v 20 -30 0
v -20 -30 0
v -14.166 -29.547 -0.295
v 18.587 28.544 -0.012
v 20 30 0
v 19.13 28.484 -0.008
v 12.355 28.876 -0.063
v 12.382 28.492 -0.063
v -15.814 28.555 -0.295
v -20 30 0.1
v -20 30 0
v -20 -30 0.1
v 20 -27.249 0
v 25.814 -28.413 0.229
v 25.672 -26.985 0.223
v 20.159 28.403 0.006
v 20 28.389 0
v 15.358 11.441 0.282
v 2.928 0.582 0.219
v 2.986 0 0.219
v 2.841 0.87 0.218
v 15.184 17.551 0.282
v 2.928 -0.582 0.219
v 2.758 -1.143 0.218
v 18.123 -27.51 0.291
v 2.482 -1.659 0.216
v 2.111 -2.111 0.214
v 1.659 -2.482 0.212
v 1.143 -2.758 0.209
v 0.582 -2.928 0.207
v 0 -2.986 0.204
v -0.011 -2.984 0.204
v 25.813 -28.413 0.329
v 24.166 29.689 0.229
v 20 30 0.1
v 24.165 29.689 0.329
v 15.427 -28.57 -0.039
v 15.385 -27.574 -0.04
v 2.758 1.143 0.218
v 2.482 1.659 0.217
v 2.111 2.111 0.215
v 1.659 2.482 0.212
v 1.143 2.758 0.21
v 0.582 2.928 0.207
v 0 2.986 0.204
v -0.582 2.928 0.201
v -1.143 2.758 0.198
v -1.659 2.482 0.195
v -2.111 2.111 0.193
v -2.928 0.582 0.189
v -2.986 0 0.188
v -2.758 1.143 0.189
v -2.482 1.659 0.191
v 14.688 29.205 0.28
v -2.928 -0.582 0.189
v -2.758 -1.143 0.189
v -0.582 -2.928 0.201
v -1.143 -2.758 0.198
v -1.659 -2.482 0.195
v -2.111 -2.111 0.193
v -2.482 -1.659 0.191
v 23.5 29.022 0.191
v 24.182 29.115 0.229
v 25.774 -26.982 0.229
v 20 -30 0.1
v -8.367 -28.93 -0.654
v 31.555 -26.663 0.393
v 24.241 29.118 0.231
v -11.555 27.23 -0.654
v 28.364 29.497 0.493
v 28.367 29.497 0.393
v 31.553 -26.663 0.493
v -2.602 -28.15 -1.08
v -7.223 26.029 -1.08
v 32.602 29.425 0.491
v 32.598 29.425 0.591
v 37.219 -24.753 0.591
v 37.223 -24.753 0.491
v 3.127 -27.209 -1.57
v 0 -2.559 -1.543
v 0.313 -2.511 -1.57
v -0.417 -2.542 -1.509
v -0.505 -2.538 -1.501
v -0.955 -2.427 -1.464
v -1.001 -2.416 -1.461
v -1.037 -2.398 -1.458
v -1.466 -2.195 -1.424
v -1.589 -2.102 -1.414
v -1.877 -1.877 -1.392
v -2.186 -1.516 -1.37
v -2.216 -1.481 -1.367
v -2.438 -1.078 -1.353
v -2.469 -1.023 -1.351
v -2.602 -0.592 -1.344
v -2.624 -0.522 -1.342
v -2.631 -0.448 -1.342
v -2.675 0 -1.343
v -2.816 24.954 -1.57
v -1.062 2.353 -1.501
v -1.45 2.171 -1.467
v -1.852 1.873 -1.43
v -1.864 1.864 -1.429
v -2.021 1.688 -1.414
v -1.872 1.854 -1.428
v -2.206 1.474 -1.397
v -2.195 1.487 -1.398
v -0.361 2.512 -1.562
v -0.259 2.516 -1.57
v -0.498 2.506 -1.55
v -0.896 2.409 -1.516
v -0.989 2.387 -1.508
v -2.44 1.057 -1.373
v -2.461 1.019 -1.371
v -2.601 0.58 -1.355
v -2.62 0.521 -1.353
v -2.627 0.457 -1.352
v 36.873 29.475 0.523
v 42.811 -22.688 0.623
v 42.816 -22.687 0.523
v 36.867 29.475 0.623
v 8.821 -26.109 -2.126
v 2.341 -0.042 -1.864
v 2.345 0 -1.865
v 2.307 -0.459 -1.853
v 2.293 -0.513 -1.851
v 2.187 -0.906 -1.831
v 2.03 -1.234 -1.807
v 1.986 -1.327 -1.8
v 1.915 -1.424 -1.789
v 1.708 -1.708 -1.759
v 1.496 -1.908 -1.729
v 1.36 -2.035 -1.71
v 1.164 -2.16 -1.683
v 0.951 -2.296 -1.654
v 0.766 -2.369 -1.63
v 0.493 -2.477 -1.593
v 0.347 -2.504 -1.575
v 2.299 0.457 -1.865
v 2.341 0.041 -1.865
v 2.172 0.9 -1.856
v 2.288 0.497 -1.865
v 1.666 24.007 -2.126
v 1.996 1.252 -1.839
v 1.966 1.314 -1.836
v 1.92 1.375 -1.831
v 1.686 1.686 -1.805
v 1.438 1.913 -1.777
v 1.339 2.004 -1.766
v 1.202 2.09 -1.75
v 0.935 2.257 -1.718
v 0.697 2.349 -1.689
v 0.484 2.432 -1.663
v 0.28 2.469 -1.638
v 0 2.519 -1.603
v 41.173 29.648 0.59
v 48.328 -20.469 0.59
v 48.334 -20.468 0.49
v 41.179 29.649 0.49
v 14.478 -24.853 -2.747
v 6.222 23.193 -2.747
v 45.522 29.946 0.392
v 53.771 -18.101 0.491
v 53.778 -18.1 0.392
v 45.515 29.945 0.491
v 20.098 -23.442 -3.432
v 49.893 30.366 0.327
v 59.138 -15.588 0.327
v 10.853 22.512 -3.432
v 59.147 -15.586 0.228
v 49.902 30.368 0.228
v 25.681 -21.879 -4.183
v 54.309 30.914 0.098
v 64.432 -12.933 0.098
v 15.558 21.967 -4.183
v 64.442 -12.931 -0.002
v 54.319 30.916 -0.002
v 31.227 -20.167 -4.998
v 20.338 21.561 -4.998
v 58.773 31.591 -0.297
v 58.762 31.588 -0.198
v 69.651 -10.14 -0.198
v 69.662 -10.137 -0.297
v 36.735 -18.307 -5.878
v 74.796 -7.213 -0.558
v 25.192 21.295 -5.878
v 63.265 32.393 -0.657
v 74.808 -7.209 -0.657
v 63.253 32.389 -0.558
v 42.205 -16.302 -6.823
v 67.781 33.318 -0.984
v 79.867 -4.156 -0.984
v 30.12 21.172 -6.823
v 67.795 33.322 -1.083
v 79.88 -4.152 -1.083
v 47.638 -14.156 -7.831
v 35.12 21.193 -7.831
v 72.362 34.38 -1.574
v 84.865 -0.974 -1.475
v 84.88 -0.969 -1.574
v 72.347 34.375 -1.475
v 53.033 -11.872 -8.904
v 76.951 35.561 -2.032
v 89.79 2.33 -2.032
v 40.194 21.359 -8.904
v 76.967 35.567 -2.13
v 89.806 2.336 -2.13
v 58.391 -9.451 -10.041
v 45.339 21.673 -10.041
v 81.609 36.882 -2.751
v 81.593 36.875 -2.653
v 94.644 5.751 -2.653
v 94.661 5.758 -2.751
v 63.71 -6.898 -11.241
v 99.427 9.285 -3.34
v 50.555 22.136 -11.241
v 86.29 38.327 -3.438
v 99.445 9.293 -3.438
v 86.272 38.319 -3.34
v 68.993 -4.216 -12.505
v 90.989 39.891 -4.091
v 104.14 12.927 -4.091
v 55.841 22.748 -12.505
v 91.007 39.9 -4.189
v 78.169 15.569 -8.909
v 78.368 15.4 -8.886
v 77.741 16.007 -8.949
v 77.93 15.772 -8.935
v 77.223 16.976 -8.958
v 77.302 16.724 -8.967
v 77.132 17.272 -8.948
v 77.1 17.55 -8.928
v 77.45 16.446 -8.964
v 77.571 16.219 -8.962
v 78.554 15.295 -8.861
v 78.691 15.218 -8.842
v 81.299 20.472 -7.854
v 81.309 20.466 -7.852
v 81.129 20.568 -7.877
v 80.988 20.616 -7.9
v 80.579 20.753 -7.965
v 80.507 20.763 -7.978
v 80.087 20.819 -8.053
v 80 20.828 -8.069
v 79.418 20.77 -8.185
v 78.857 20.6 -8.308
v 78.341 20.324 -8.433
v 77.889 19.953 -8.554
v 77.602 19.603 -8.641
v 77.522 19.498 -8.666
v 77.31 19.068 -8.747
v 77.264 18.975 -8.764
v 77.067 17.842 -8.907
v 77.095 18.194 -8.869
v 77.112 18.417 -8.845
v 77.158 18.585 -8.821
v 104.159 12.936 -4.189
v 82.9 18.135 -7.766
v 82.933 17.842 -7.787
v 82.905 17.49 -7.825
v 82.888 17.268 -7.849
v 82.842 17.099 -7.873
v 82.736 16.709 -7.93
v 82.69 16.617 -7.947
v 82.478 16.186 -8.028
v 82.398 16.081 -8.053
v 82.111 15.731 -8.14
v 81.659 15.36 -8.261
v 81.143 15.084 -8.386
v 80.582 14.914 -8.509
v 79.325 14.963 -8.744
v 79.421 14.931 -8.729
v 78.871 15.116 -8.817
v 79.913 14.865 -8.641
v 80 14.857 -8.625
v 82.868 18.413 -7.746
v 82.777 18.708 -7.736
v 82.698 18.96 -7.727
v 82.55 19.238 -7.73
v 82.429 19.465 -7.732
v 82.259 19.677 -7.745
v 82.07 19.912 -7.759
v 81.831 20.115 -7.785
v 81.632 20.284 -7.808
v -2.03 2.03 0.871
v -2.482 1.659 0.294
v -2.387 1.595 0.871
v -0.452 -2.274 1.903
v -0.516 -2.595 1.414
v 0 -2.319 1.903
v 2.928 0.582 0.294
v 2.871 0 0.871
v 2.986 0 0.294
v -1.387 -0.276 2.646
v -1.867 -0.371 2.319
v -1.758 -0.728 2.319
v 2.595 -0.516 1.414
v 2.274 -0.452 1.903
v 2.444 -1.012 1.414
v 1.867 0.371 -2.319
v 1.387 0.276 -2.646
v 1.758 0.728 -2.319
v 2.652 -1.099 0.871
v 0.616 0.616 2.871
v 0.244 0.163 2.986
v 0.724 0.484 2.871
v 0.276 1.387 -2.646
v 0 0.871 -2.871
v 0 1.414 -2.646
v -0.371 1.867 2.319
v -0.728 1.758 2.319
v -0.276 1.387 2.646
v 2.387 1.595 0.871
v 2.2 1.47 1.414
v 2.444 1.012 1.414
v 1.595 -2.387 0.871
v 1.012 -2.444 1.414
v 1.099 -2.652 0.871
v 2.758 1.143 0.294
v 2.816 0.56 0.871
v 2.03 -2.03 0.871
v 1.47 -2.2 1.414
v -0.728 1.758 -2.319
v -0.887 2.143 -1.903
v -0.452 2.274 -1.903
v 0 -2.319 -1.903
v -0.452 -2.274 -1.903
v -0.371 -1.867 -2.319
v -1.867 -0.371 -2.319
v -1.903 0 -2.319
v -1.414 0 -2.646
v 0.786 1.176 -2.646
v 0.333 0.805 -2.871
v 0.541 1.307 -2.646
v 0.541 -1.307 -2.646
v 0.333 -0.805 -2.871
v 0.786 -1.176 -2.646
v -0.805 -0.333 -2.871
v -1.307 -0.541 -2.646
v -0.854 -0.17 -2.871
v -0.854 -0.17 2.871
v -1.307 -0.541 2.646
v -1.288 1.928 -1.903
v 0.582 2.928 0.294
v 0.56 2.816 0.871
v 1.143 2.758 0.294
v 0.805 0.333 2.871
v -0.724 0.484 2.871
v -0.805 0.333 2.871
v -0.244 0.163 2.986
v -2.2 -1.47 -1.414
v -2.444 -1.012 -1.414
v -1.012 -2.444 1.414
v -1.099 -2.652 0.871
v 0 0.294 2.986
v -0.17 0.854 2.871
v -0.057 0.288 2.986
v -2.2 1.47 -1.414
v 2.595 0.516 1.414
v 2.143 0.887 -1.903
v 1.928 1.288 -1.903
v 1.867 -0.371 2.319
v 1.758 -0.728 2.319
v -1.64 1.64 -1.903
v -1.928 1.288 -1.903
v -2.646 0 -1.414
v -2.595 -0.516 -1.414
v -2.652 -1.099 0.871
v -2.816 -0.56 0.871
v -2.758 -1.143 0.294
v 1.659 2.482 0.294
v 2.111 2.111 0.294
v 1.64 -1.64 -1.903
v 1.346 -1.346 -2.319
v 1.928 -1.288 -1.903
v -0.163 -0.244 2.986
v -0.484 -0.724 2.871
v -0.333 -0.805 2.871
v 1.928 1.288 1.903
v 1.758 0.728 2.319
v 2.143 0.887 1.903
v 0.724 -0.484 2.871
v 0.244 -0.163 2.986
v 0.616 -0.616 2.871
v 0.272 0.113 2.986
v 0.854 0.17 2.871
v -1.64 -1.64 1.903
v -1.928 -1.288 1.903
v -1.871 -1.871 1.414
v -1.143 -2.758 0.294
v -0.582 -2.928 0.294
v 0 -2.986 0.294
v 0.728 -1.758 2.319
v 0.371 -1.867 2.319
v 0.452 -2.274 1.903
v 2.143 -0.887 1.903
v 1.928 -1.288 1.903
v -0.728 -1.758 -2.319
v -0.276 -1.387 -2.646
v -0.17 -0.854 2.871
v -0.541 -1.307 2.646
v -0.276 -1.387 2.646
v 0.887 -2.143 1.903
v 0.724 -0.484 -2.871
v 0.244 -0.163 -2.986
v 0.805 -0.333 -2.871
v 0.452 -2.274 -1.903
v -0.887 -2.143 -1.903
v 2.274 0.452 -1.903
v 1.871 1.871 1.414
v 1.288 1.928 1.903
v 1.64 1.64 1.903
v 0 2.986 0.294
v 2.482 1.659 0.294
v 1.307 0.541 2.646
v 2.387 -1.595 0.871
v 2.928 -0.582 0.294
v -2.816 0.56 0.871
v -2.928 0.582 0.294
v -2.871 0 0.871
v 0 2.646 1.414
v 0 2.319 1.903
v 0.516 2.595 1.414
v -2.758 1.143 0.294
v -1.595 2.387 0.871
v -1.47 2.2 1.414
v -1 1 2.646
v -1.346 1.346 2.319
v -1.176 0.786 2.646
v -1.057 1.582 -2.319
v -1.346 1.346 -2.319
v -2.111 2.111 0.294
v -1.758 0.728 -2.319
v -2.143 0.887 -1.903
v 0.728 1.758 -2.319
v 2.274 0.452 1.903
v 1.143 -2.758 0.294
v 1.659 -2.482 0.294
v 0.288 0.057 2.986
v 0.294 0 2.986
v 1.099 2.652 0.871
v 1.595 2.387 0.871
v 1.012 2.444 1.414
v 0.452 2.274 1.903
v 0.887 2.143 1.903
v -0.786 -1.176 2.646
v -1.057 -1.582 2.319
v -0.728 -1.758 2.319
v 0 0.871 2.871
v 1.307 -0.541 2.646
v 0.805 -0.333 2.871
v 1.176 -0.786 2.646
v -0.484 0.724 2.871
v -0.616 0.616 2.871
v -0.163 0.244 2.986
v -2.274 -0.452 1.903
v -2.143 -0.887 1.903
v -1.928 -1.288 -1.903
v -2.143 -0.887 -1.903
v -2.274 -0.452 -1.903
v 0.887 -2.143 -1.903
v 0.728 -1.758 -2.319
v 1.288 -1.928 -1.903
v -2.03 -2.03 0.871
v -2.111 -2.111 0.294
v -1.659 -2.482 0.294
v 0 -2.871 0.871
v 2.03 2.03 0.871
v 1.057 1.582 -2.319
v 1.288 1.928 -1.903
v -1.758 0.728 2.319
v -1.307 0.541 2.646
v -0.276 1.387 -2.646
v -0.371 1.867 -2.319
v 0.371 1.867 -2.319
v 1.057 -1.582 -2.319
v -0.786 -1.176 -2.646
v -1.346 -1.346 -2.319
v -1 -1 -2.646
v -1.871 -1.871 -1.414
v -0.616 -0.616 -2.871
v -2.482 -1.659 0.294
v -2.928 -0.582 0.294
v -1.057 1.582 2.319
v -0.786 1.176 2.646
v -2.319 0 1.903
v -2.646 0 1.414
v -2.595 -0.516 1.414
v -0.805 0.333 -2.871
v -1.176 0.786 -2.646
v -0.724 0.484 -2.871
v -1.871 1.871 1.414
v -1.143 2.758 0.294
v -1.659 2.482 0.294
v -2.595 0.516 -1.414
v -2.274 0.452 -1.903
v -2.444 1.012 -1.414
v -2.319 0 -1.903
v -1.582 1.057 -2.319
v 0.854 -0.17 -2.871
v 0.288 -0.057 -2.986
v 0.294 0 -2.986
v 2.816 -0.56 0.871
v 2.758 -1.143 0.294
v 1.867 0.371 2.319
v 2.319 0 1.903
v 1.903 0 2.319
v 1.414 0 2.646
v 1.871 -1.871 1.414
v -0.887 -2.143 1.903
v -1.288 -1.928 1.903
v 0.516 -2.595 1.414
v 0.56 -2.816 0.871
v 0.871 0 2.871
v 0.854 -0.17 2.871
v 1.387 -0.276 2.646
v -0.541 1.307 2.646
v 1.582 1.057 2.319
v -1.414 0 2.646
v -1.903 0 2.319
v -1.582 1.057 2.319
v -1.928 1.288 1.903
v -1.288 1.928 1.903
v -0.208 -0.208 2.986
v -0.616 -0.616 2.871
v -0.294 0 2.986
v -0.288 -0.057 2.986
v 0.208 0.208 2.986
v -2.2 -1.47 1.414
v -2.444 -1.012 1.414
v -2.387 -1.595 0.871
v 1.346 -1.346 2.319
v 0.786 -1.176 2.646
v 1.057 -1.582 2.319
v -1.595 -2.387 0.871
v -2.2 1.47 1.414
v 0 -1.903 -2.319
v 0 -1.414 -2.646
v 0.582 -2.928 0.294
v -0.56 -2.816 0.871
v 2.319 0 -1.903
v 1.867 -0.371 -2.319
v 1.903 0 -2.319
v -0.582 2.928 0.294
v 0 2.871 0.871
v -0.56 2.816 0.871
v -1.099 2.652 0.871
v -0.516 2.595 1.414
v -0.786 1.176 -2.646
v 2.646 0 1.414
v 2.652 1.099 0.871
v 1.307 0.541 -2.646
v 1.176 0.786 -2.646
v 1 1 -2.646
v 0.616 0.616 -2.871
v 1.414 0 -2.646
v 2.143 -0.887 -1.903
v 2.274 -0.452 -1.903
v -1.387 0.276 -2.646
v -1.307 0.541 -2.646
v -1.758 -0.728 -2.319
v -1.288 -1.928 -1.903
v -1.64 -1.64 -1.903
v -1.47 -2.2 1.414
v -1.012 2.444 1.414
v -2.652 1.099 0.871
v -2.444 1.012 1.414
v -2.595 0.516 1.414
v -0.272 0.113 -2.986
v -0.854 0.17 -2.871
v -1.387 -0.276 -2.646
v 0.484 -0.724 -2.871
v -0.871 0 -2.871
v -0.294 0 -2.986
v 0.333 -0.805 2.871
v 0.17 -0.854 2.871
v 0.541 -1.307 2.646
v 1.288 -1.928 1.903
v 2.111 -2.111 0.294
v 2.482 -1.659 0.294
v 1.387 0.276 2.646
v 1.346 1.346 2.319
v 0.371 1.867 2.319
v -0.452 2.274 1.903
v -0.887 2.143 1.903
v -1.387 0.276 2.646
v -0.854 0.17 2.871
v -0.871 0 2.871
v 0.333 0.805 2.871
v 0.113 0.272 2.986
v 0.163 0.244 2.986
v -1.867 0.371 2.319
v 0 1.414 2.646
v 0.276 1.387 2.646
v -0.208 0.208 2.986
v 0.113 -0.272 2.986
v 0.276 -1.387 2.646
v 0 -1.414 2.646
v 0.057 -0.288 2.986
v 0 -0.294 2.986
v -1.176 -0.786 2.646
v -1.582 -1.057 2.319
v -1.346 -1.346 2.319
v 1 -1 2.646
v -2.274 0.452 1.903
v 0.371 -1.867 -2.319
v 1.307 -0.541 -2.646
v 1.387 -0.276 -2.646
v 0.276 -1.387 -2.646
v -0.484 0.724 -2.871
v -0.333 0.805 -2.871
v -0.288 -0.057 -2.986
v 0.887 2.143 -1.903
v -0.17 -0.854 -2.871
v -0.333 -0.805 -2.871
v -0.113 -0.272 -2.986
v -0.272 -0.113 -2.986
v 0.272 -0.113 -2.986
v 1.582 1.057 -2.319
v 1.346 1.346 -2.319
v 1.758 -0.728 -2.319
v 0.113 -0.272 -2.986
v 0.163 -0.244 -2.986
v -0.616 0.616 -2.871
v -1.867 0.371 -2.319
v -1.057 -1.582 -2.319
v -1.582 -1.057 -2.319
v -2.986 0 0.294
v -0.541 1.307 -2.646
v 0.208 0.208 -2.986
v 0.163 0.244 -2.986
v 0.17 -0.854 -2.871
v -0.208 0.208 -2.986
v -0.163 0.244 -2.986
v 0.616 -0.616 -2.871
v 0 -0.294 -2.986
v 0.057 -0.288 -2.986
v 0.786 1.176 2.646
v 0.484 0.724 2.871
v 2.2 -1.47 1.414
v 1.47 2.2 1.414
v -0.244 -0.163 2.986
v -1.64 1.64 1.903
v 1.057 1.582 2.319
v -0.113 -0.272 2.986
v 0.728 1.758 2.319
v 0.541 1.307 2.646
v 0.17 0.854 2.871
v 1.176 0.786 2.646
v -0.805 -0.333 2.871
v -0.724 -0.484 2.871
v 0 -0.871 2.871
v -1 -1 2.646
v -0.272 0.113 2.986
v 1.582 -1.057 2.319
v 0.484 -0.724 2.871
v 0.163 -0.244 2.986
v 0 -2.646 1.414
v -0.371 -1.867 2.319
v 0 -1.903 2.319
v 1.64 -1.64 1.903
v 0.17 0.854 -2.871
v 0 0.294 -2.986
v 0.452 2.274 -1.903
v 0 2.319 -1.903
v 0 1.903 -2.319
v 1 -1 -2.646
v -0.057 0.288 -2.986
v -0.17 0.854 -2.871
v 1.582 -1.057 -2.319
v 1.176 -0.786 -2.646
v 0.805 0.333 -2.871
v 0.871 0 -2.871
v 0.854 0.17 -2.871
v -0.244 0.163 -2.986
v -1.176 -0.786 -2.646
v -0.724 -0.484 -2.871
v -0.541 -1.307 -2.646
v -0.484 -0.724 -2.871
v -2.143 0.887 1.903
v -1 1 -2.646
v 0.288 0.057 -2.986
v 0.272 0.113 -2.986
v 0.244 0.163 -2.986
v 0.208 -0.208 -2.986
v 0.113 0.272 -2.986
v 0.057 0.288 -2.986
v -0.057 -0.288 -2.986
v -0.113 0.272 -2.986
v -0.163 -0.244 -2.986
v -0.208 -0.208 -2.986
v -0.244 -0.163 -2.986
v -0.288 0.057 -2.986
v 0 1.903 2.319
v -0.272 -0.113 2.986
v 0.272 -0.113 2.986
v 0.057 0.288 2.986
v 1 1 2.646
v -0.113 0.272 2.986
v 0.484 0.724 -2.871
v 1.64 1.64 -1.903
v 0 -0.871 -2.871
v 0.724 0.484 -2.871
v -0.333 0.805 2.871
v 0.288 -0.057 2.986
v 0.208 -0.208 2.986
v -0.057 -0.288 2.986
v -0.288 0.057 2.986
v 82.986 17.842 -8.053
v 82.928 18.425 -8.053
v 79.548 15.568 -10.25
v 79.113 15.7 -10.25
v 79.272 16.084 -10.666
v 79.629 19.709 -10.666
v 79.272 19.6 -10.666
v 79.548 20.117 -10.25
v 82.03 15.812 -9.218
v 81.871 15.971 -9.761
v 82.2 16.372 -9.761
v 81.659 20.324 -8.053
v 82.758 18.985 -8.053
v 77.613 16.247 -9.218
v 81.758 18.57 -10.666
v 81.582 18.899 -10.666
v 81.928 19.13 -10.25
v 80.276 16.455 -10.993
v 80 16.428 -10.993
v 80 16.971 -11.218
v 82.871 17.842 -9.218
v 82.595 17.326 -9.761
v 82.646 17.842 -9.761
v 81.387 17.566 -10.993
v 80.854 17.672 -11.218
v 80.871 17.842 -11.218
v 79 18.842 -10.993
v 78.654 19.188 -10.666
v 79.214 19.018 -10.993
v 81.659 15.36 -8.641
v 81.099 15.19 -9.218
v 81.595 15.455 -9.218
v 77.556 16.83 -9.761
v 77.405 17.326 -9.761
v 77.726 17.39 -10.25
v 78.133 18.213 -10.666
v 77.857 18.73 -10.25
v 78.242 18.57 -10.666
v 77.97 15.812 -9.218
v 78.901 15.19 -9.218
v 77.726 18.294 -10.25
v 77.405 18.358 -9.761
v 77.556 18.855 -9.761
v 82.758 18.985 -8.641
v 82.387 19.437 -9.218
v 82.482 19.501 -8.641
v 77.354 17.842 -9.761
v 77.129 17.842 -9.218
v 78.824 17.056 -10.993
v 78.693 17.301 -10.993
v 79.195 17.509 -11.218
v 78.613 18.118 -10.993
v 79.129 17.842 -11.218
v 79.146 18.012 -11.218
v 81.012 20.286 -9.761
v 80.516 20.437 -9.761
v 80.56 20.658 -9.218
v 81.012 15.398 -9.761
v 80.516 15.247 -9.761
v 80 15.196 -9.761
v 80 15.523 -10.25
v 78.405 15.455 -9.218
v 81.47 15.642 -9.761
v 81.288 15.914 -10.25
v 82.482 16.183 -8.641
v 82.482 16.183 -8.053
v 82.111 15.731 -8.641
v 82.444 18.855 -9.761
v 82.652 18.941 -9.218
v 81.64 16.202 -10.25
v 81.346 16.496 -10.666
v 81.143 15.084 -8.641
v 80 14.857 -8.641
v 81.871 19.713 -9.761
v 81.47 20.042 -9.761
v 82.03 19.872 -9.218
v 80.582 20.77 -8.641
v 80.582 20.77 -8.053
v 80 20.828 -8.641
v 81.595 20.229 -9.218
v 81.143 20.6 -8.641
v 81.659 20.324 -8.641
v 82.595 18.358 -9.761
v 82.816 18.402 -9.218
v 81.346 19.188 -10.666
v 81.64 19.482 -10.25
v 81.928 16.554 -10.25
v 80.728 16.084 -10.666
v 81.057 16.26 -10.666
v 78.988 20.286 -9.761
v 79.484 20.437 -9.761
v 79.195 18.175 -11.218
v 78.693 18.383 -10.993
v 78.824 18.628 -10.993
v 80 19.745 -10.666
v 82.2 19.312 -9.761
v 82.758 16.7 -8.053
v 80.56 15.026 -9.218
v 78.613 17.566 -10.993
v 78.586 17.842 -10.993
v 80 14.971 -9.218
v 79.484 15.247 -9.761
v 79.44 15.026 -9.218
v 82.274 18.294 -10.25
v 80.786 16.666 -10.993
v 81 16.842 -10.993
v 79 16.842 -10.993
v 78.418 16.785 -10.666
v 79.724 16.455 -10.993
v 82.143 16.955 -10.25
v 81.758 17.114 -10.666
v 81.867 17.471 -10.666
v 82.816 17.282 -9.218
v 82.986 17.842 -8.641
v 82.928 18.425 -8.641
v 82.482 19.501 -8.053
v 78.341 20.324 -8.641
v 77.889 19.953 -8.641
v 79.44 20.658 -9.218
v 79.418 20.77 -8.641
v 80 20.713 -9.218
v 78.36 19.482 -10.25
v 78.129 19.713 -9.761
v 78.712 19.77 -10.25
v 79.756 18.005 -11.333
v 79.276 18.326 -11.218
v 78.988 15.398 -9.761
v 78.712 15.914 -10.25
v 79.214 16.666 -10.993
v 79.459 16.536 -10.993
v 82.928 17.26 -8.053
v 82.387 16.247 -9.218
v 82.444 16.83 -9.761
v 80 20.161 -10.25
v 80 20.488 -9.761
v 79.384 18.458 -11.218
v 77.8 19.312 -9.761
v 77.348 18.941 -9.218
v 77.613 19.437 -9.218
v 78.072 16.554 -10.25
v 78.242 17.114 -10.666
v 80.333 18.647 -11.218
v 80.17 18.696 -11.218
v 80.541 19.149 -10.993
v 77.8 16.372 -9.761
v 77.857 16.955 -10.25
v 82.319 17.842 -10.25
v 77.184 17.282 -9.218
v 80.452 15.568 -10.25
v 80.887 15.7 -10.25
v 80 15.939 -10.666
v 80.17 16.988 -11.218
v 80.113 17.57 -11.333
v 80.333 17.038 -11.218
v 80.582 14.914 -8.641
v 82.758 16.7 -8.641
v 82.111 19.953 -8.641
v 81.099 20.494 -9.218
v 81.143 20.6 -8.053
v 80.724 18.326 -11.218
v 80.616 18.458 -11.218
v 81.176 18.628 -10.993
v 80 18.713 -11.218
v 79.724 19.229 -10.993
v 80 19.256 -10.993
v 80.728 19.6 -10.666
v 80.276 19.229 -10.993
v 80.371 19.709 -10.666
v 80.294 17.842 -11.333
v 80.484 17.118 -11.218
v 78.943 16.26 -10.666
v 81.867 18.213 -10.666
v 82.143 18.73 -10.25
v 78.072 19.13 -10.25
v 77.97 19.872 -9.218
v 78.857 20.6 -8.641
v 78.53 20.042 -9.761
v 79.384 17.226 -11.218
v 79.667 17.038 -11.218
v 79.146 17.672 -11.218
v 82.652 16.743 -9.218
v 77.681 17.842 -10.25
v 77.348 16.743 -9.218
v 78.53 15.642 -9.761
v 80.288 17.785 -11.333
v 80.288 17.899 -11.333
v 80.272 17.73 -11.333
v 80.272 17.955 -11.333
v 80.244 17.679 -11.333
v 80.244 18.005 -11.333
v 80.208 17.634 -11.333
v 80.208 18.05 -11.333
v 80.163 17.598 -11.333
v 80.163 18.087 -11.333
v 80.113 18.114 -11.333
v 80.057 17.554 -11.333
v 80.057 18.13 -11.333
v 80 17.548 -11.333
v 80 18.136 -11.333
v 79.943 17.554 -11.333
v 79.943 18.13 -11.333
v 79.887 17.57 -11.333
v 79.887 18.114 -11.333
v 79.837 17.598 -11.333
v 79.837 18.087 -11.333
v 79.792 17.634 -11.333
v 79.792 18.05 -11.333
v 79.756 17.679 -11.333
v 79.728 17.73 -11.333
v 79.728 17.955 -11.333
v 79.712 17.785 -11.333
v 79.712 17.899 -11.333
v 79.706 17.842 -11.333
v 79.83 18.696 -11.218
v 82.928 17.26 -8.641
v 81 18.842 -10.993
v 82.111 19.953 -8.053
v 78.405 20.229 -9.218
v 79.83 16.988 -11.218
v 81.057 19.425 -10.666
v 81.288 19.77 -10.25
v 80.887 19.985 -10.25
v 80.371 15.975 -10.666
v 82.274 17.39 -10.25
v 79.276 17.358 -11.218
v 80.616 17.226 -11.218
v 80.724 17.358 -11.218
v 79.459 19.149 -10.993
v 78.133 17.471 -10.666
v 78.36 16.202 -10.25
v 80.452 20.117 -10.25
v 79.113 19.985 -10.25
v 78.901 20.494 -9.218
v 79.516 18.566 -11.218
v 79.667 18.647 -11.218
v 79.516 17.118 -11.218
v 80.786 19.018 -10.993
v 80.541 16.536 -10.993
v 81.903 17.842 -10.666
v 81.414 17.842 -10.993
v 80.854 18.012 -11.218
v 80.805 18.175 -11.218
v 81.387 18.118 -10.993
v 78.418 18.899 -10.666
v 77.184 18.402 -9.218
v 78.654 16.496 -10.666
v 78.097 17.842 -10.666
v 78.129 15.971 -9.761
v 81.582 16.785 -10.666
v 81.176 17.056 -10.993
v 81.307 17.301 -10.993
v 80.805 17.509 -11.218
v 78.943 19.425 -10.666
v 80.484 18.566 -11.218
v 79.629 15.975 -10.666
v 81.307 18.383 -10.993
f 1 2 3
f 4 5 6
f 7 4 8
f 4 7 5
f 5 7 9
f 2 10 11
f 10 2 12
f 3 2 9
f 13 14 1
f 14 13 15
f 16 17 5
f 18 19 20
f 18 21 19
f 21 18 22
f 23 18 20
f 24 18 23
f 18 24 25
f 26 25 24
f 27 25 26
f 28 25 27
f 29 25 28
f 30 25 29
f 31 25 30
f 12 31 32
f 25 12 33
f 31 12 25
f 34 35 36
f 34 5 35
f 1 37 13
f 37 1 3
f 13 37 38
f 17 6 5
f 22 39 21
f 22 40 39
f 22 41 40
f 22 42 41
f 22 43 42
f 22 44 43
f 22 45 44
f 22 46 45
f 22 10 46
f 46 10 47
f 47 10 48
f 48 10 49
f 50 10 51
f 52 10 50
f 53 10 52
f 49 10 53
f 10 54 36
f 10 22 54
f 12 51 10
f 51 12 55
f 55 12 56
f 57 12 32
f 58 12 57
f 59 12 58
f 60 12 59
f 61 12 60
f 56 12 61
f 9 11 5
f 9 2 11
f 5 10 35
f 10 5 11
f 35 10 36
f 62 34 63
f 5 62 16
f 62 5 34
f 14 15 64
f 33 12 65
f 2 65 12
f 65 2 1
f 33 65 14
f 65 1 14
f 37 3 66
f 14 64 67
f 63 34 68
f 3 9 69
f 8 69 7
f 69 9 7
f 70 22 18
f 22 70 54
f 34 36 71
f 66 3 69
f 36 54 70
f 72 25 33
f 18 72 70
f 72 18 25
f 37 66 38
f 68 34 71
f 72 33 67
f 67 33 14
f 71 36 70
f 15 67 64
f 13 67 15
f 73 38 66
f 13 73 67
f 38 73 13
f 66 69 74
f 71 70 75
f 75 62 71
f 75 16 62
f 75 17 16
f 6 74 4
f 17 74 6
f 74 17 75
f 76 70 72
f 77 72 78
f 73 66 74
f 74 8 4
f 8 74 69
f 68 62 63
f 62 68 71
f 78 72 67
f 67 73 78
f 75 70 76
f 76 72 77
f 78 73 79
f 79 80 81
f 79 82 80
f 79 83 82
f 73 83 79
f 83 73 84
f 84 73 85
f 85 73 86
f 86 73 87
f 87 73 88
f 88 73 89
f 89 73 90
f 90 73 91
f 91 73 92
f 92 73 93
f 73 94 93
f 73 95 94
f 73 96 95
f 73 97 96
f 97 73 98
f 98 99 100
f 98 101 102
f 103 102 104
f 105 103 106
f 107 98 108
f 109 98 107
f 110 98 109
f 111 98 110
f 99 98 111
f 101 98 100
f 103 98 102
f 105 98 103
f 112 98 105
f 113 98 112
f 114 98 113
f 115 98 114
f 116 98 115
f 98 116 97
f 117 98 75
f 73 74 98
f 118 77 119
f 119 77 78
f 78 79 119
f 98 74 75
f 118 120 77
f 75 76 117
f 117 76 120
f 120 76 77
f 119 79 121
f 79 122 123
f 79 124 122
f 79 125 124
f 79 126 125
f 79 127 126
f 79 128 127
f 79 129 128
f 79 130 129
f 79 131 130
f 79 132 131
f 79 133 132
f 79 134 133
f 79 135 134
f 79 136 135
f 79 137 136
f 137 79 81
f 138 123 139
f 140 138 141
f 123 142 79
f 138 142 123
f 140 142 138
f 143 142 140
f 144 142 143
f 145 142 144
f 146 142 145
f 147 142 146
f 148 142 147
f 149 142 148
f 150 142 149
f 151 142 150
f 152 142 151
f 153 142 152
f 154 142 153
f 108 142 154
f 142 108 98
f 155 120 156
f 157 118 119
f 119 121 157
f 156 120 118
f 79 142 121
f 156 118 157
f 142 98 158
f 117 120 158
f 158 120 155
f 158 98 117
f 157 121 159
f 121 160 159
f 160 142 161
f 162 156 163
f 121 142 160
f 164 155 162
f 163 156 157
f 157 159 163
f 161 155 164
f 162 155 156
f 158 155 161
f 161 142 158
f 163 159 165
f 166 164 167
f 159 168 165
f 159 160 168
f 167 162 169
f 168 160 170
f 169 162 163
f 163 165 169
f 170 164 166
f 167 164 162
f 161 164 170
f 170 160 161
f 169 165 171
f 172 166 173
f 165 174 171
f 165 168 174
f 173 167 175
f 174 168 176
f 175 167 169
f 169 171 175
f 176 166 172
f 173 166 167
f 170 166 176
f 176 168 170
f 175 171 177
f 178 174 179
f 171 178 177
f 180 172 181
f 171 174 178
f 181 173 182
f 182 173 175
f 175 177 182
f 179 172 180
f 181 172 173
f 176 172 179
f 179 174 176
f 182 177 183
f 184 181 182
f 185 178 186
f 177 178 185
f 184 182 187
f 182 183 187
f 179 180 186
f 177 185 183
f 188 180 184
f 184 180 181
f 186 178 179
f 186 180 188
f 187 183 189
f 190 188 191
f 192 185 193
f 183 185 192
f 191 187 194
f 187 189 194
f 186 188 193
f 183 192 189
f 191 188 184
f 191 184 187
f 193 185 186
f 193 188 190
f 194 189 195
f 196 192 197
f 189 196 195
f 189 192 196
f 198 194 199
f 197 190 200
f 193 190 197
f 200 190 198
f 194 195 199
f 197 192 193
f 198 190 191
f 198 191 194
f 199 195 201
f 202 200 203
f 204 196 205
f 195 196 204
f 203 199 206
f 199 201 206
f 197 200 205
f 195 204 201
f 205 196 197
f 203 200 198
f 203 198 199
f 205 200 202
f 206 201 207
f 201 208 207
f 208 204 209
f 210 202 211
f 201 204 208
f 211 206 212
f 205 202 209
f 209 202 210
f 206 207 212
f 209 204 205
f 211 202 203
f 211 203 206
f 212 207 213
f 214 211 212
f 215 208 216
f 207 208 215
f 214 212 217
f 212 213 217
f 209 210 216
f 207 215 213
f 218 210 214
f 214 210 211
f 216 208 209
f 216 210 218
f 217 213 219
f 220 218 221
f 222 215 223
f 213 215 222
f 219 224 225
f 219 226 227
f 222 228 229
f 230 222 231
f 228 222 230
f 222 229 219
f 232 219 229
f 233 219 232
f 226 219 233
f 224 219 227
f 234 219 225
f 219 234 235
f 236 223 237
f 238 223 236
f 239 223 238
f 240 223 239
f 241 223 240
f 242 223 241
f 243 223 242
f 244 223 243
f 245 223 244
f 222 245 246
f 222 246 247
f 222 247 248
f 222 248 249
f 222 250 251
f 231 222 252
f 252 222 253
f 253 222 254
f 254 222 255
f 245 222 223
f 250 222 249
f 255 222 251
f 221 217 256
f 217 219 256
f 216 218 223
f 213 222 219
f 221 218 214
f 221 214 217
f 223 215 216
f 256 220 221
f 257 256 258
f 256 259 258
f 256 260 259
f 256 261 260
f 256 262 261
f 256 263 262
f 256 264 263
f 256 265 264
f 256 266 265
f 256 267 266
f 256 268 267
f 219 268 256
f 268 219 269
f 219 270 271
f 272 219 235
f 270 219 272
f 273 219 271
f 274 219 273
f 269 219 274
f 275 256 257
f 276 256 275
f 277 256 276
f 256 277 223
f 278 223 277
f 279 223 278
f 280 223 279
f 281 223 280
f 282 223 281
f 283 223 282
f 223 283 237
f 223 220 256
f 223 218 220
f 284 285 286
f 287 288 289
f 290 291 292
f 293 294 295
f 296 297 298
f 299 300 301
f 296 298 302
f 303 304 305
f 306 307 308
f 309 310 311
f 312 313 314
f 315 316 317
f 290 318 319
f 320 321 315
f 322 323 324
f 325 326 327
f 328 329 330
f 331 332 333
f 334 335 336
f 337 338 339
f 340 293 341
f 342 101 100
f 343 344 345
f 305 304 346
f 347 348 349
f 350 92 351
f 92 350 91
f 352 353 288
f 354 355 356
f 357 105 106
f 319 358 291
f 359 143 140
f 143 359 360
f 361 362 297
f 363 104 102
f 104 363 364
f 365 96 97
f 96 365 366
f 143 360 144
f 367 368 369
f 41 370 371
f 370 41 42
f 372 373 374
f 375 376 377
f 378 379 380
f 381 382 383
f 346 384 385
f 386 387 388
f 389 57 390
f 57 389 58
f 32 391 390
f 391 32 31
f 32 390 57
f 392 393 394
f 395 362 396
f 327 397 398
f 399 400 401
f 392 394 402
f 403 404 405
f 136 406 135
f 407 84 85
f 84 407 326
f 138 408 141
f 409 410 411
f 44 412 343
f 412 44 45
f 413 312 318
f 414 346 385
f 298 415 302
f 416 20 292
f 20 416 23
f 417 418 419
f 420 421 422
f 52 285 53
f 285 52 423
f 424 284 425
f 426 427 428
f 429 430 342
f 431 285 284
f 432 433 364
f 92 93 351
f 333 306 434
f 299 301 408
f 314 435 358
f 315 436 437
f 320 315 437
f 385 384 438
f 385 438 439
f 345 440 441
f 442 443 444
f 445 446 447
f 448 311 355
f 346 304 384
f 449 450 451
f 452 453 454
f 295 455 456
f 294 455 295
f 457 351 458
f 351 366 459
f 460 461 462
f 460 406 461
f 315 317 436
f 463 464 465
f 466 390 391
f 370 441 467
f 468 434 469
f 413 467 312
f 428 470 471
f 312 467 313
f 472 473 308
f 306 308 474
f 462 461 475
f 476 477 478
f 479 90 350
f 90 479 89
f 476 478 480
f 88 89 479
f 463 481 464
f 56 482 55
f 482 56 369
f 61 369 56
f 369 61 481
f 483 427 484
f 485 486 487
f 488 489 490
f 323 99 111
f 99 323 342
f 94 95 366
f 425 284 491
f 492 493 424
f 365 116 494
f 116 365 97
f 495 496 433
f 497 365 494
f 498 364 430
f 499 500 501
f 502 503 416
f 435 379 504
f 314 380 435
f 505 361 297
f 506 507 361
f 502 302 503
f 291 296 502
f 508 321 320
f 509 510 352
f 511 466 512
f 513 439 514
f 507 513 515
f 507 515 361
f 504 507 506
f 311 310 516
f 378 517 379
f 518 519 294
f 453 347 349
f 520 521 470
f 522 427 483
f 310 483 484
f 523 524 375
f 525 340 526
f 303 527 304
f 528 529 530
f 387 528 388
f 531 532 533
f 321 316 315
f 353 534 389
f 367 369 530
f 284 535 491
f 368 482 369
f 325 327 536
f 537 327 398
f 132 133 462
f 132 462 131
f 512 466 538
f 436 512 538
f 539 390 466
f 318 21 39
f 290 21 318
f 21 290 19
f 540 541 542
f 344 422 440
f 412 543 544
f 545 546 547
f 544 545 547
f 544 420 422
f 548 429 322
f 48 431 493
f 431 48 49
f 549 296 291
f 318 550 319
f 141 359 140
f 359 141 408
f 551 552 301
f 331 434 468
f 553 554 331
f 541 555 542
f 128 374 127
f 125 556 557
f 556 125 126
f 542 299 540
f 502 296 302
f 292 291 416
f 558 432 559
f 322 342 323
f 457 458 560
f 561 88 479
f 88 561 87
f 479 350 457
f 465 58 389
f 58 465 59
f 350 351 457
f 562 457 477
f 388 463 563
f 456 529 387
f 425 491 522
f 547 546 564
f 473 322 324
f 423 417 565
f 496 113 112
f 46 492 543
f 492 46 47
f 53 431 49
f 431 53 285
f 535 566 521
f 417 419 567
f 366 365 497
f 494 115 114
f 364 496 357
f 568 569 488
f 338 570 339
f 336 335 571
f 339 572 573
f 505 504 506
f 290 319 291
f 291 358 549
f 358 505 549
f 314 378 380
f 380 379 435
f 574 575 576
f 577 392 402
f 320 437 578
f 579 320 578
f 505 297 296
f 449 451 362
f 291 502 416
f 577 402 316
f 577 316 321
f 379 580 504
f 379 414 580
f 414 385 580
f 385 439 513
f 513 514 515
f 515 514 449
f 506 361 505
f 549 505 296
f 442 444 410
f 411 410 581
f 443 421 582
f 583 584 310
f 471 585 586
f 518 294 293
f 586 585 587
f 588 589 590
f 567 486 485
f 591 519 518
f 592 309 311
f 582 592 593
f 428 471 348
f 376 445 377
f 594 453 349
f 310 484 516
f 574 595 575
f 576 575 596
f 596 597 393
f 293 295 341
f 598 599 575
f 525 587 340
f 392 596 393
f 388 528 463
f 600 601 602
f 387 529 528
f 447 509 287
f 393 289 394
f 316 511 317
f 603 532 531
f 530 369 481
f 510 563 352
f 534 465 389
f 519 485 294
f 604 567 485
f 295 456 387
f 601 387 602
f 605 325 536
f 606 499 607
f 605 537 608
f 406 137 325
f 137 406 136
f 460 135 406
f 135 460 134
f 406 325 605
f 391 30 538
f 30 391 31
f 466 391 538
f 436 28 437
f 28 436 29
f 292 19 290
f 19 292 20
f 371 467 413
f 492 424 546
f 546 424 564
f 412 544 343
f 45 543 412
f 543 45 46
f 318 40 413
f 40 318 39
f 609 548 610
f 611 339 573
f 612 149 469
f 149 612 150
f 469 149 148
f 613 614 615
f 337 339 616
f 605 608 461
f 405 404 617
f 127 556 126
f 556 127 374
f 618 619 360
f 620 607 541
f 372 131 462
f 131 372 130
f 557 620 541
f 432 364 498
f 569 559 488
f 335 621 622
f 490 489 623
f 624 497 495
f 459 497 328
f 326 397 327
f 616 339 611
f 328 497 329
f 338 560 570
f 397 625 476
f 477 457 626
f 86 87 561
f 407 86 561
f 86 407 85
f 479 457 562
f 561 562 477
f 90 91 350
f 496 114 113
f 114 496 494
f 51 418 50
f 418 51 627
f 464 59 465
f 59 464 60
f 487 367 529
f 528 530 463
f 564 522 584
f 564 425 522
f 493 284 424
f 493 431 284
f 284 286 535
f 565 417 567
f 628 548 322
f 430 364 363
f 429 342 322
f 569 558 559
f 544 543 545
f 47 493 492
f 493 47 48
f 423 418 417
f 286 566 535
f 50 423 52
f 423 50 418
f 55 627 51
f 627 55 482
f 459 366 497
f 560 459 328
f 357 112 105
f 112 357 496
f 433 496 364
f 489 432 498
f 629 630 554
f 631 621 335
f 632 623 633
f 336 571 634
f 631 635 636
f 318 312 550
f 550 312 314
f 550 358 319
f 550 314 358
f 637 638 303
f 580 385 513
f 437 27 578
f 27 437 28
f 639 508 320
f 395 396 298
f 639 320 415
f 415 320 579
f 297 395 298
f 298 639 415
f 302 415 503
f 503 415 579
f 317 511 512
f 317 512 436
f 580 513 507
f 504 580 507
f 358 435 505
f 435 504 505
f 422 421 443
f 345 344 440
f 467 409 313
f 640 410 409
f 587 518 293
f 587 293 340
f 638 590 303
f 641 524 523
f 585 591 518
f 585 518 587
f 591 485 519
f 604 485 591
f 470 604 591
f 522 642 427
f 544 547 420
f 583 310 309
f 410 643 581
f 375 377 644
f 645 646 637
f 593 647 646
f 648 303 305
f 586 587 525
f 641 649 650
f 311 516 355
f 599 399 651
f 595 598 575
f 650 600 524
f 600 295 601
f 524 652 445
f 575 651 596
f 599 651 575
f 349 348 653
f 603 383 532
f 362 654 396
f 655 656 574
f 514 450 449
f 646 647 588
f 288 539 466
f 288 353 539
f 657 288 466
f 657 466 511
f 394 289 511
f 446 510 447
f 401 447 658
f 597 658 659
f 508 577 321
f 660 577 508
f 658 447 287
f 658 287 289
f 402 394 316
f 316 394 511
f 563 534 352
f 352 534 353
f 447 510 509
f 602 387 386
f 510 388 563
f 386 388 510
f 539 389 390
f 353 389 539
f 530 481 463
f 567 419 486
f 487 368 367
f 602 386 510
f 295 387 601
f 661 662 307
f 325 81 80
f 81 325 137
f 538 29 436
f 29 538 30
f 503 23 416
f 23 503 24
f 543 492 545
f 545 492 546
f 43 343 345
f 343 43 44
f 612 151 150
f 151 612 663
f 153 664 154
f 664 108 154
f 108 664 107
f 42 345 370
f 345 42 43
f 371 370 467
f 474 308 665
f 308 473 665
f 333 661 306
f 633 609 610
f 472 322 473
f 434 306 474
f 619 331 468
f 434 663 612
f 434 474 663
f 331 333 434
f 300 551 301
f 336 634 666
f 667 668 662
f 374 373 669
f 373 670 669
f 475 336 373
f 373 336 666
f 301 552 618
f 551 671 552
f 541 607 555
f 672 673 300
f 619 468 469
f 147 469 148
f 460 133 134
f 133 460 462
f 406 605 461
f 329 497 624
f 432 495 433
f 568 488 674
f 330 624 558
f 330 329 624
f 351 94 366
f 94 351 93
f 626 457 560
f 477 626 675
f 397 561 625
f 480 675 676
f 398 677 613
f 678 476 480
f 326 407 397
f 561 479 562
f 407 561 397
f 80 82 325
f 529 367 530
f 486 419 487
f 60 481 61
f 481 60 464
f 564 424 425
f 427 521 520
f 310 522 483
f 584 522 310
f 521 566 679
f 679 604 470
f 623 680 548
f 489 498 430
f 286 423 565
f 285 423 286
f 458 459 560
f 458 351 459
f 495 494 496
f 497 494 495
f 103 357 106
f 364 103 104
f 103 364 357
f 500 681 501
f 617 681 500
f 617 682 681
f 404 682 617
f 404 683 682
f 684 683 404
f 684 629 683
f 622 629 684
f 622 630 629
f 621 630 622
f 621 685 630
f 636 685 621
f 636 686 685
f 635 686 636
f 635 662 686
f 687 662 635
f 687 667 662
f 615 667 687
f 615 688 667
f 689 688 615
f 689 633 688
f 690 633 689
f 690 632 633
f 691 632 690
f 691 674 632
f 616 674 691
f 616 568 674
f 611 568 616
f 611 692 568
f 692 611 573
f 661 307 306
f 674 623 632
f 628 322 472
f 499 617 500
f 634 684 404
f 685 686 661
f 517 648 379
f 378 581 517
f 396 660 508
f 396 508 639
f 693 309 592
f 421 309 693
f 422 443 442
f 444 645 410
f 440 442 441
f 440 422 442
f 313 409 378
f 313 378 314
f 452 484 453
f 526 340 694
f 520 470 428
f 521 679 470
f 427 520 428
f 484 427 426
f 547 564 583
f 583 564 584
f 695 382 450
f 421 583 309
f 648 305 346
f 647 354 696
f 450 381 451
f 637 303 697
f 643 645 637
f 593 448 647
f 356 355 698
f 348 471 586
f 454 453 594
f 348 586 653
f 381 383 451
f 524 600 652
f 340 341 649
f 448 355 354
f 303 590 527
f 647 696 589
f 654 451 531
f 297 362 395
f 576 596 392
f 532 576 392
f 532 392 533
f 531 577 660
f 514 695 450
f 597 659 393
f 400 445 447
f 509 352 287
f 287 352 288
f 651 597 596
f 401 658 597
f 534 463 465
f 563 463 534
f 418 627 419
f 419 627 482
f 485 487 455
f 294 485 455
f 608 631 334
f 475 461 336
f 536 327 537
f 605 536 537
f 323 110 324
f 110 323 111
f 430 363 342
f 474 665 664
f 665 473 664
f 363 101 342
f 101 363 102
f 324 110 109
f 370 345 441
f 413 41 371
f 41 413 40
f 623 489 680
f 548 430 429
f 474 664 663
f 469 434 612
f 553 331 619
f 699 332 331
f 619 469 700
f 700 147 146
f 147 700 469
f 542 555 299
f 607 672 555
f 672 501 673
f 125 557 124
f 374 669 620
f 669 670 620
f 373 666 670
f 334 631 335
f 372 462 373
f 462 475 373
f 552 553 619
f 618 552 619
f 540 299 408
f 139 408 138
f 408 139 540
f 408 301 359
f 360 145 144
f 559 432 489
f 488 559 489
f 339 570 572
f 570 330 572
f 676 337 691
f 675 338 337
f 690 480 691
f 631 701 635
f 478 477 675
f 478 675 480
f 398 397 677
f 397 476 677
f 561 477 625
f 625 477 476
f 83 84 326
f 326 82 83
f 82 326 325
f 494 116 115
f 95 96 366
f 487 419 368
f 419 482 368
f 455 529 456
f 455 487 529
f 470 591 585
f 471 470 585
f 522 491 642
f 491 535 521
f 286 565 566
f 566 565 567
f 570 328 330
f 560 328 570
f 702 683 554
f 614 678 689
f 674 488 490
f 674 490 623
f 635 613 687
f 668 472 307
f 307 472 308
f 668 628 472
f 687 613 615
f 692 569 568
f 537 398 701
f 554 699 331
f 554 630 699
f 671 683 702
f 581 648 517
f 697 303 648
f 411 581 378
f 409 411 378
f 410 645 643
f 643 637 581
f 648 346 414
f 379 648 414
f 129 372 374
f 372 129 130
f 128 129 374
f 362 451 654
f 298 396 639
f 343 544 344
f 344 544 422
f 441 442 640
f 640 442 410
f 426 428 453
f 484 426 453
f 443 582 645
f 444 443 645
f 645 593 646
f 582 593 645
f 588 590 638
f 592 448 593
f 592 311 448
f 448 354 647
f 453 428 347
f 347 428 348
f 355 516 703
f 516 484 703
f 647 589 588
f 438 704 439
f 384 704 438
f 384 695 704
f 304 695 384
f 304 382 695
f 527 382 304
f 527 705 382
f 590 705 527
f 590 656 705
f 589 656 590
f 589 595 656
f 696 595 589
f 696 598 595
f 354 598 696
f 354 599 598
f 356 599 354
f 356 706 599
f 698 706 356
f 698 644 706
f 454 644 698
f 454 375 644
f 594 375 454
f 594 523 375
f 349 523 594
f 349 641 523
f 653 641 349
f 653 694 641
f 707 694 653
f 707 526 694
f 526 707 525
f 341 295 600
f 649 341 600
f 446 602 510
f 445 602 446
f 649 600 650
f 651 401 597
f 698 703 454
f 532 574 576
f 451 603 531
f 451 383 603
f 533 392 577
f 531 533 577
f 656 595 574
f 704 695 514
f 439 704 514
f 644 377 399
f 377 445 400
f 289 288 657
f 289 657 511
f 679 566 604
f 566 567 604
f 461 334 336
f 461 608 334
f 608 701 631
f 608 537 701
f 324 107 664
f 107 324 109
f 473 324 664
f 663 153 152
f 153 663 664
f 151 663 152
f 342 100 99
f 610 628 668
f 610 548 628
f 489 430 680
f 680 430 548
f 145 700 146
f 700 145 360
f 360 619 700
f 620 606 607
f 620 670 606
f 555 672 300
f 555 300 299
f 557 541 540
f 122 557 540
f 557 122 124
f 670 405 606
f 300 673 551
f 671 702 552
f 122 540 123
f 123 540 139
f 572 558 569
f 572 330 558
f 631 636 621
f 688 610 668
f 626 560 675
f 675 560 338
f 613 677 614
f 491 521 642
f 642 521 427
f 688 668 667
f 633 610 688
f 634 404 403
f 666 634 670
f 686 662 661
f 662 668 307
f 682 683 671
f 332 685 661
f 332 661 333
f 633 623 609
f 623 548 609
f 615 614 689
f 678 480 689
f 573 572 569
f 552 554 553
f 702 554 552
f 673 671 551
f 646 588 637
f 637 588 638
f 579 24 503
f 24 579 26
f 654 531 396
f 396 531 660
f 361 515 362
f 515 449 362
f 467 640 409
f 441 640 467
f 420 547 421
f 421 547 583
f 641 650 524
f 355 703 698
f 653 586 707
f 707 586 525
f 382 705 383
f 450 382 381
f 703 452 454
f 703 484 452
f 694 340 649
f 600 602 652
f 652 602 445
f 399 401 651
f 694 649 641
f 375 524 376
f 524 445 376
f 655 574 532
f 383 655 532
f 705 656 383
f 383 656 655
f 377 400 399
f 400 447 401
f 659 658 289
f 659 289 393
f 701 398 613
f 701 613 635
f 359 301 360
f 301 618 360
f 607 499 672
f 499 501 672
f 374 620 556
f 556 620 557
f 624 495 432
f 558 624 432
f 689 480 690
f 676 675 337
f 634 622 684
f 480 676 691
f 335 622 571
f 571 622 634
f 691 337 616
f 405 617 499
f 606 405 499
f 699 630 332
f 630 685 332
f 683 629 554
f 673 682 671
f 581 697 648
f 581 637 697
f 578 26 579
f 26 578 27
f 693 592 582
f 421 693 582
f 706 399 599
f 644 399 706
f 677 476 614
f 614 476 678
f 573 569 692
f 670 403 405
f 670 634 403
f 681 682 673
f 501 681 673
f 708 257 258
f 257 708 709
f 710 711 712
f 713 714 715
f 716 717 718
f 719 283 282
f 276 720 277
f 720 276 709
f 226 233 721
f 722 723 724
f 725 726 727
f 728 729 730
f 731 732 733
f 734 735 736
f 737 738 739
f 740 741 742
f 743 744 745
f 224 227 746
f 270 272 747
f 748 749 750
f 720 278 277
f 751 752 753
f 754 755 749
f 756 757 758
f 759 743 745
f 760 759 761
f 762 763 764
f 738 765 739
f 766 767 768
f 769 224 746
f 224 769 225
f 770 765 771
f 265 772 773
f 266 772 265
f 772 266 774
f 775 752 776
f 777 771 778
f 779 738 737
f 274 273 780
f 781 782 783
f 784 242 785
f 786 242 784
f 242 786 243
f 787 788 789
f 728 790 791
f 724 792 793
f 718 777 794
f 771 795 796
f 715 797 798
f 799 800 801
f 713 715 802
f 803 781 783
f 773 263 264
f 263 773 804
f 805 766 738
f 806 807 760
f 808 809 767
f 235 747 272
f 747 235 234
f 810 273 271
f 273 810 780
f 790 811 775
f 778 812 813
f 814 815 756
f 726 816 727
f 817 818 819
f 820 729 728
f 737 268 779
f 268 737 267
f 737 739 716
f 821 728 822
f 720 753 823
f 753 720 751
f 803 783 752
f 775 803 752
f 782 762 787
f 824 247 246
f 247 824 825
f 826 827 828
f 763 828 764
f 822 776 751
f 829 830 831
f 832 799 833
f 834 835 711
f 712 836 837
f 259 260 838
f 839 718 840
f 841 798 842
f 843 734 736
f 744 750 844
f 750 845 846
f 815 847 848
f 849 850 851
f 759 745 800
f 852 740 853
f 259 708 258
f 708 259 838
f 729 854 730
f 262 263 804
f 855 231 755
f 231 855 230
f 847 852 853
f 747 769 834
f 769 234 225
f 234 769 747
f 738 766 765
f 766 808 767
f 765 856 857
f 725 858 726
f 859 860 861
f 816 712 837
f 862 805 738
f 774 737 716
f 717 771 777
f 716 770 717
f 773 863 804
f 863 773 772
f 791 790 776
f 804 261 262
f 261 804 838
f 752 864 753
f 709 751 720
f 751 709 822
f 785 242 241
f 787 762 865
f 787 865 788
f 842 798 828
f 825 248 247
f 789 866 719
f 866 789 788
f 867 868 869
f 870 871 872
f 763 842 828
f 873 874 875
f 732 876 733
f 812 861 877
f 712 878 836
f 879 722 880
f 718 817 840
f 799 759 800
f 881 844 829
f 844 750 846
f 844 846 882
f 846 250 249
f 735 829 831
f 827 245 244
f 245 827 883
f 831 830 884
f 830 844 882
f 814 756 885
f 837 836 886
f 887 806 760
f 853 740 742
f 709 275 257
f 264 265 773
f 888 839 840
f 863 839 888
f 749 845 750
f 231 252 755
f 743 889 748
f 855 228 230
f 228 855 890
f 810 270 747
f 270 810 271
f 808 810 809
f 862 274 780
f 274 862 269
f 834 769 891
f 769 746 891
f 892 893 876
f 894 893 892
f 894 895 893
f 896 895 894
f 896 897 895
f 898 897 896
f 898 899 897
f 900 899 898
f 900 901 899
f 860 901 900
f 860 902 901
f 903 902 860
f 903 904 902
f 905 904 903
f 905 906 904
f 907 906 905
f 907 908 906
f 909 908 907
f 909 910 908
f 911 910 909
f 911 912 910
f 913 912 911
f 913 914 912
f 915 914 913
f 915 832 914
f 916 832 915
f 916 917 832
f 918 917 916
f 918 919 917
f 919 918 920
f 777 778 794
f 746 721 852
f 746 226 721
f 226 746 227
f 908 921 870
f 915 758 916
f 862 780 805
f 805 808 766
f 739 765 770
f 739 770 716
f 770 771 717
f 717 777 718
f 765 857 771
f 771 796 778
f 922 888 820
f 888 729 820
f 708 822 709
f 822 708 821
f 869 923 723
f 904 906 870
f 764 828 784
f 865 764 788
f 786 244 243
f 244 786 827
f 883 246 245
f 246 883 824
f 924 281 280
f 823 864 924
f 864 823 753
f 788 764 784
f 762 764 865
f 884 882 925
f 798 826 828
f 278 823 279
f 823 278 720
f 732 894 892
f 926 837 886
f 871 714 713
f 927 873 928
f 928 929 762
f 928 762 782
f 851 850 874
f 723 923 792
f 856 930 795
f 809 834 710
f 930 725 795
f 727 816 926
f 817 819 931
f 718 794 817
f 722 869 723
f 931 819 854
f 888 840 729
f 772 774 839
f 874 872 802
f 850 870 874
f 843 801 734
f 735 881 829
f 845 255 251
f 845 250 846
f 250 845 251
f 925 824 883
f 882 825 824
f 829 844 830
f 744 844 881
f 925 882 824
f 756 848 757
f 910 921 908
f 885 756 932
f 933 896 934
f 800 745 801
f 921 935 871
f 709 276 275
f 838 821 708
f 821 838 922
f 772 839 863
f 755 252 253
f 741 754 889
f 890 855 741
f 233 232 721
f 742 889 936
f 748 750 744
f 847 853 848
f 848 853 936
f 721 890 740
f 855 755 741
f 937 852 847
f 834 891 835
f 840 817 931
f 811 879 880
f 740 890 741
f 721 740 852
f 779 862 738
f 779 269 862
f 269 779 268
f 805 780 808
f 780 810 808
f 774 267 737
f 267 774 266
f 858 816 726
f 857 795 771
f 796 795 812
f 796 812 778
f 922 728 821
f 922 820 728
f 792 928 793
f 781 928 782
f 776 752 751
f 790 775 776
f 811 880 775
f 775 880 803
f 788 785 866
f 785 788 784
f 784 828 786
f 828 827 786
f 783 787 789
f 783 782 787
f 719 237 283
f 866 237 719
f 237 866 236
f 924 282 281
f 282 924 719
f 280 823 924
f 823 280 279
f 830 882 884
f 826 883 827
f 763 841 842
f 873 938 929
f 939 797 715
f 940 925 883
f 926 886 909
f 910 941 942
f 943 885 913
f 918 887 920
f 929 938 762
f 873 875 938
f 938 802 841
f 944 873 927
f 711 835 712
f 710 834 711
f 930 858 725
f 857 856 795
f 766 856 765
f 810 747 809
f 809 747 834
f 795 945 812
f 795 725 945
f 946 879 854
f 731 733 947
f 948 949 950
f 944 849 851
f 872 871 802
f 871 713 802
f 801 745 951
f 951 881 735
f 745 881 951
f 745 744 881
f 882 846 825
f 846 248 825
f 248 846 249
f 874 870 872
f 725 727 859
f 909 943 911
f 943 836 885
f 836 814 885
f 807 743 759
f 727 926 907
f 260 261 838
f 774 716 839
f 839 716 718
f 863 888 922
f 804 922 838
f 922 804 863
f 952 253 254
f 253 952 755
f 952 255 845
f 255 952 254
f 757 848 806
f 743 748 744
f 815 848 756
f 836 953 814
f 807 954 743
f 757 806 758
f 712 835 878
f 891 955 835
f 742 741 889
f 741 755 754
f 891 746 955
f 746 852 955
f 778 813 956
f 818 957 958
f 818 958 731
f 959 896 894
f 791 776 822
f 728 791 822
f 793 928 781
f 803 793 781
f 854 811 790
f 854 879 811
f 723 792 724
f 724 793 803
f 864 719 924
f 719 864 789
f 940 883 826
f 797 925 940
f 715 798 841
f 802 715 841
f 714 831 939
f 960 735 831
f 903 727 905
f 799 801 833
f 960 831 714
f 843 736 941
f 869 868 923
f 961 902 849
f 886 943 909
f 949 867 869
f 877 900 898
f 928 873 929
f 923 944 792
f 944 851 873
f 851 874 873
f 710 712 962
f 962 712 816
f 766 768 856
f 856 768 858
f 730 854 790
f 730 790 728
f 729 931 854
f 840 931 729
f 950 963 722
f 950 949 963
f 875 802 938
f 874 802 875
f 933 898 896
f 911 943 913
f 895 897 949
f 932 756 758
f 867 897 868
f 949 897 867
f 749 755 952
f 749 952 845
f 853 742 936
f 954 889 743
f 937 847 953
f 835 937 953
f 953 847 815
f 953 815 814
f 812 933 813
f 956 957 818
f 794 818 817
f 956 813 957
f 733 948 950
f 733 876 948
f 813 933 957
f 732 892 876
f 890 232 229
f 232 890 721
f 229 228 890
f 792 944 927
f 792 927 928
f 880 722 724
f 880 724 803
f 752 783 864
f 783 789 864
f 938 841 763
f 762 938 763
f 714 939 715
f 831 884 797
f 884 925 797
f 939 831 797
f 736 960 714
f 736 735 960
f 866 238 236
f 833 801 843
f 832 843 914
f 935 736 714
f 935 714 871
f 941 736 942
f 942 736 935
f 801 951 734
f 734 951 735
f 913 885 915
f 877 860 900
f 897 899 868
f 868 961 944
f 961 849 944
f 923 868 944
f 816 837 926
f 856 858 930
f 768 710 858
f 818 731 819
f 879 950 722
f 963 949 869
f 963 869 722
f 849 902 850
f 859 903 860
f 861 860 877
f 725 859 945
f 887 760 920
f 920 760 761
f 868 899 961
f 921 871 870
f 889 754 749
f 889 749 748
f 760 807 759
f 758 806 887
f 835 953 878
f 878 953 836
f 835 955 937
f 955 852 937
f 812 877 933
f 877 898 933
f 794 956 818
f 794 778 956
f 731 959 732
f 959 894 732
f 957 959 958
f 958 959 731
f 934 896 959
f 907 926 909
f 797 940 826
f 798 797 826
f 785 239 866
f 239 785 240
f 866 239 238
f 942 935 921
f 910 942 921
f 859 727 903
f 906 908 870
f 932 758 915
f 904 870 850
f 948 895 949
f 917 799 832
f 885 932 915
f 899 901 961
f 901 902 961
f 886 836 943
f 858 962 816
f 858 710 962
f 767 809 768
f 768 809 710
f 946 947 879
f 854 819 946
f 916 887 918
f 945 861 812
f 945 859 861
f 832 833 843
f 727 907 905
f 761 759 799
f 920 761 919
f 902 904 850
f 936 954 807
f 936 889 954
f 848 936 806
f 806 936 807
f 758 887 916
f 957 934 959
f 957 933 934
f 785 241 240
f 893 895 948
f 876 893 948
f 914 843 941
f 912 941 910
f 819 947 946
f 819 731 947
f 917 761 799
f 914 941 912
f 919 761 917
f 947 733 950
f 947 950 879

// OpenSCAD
// tests/arm_spike.scad
// Spike: prove the hull-of-segments approach works for a 3D curved sweep.
// This is throwaway code — once the approach is validated, the real arm.scad
// will use the same technique with proper parameters.

$fn = 32;

// Toy parameters
L = 80;                  // total arc length
TOE = 26;                // plan angle (degrees)
TILT = 12;               // tilt angle (degrees)
ROOT_H = 60;
TIP_H = 30;
W = 40;
N = 16;                  // number of sample points

// Centerline functions (parameter t in [0, 1])
function centerline_pos(t) =
    let(theta_p = TOE * t, theta_s = TILT * t,
        R_plan = L / (TOE * PI / 180),
        R_side = L / (TILT * PI / 180))
    [ L * t,
      R_plan * (1 - cos(theta_p)),
      -R_side * (1 - cos(theta_s)) ];

function centerline_yaw(t) = TOE * t;
function centerline_pitch(t) = -TILT * t;

function cross_section_h(t) = ROOT_H + (TIP_H - ROOT_H) * t;

// Build the arm by hulling consecutive segments
module arm_spike() {
    for (i = [0 : N-1]) {
        t1 = i / N;
        t2 = (i + 1) / N;
        hull() {
            translate(centerline_pos(t1))
                rotate([0, centerline_pitch(t1), centerline_yaw(t1)])
                    linear_extrude(0.1)
                        square([W, cross_section_h(t1)], center = true);
            translate(centerline_pos(t2))
                rotate([0, centerline_pitch(t2), centerline_yaw(t2)])
                    linear_extrude(0.1)
                        square([W, cross_section_h(t2)], center = true);
        }
    }
}

arm_spike();

// Reference markers at endpoints
color("red")  translate(centerline_pos(0)) sphere(3);
color("blue") translate(centerline_pos(1)) sphere(3);
